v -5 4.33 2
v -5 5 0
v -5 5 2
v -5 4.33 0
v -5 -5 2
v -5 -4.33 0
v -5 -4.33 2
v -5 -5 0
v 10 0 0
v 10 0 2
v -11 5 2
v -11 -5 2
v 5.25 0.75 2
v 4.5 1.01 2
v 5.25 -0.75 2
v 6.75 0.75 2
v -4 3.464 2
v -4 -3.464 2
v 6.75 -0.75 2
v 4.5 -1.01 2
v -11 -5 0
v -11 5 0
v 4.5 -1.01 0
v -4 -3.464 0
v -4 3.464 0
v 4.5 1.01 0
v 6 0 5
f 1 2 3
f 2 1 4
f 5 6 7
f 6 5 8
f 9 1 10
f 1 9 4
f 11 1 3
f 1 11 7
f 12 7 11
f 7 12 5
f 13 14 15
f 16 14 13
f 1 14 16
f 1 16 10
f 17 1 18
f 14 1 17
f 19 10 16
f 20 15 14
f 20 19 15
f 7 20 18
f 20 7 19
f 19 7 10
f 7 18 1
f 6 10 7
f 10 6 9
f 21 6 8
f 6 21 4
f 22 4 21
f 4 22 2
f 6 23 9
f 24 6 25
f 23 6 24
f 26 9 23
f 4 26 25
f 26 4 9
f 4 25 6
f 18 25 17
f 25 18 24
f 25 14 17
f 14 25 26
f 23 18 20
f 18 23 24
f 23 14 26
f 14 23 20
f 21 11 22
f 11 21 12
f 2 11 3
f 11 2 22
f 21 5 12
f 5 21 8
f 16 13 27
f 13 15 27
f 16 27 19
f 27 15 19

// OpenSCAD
module Cantilever()
{
    scale([2, 1, 1])
    union()
    {
        difference()
        {
            cylinder(d = 10, h = 2, $fn = 3);
            cylinder(d = 8, h = 4, $fn = 3);
        }
        
        translate([3, 0, 0])
        cylinder(d = 3, h = 2, $fn = 3);
        
        translate([-4, 0, 1])
        cube([3, 10, 2], center = true);
    }
    
    translate([6, 0, 2])
    rotate([0, 0, 45]) 
    cylinder(d1=sqrt(pow(1.5,2)*2), d2=0, h=3, $fn=4);
}

Cantilever();
